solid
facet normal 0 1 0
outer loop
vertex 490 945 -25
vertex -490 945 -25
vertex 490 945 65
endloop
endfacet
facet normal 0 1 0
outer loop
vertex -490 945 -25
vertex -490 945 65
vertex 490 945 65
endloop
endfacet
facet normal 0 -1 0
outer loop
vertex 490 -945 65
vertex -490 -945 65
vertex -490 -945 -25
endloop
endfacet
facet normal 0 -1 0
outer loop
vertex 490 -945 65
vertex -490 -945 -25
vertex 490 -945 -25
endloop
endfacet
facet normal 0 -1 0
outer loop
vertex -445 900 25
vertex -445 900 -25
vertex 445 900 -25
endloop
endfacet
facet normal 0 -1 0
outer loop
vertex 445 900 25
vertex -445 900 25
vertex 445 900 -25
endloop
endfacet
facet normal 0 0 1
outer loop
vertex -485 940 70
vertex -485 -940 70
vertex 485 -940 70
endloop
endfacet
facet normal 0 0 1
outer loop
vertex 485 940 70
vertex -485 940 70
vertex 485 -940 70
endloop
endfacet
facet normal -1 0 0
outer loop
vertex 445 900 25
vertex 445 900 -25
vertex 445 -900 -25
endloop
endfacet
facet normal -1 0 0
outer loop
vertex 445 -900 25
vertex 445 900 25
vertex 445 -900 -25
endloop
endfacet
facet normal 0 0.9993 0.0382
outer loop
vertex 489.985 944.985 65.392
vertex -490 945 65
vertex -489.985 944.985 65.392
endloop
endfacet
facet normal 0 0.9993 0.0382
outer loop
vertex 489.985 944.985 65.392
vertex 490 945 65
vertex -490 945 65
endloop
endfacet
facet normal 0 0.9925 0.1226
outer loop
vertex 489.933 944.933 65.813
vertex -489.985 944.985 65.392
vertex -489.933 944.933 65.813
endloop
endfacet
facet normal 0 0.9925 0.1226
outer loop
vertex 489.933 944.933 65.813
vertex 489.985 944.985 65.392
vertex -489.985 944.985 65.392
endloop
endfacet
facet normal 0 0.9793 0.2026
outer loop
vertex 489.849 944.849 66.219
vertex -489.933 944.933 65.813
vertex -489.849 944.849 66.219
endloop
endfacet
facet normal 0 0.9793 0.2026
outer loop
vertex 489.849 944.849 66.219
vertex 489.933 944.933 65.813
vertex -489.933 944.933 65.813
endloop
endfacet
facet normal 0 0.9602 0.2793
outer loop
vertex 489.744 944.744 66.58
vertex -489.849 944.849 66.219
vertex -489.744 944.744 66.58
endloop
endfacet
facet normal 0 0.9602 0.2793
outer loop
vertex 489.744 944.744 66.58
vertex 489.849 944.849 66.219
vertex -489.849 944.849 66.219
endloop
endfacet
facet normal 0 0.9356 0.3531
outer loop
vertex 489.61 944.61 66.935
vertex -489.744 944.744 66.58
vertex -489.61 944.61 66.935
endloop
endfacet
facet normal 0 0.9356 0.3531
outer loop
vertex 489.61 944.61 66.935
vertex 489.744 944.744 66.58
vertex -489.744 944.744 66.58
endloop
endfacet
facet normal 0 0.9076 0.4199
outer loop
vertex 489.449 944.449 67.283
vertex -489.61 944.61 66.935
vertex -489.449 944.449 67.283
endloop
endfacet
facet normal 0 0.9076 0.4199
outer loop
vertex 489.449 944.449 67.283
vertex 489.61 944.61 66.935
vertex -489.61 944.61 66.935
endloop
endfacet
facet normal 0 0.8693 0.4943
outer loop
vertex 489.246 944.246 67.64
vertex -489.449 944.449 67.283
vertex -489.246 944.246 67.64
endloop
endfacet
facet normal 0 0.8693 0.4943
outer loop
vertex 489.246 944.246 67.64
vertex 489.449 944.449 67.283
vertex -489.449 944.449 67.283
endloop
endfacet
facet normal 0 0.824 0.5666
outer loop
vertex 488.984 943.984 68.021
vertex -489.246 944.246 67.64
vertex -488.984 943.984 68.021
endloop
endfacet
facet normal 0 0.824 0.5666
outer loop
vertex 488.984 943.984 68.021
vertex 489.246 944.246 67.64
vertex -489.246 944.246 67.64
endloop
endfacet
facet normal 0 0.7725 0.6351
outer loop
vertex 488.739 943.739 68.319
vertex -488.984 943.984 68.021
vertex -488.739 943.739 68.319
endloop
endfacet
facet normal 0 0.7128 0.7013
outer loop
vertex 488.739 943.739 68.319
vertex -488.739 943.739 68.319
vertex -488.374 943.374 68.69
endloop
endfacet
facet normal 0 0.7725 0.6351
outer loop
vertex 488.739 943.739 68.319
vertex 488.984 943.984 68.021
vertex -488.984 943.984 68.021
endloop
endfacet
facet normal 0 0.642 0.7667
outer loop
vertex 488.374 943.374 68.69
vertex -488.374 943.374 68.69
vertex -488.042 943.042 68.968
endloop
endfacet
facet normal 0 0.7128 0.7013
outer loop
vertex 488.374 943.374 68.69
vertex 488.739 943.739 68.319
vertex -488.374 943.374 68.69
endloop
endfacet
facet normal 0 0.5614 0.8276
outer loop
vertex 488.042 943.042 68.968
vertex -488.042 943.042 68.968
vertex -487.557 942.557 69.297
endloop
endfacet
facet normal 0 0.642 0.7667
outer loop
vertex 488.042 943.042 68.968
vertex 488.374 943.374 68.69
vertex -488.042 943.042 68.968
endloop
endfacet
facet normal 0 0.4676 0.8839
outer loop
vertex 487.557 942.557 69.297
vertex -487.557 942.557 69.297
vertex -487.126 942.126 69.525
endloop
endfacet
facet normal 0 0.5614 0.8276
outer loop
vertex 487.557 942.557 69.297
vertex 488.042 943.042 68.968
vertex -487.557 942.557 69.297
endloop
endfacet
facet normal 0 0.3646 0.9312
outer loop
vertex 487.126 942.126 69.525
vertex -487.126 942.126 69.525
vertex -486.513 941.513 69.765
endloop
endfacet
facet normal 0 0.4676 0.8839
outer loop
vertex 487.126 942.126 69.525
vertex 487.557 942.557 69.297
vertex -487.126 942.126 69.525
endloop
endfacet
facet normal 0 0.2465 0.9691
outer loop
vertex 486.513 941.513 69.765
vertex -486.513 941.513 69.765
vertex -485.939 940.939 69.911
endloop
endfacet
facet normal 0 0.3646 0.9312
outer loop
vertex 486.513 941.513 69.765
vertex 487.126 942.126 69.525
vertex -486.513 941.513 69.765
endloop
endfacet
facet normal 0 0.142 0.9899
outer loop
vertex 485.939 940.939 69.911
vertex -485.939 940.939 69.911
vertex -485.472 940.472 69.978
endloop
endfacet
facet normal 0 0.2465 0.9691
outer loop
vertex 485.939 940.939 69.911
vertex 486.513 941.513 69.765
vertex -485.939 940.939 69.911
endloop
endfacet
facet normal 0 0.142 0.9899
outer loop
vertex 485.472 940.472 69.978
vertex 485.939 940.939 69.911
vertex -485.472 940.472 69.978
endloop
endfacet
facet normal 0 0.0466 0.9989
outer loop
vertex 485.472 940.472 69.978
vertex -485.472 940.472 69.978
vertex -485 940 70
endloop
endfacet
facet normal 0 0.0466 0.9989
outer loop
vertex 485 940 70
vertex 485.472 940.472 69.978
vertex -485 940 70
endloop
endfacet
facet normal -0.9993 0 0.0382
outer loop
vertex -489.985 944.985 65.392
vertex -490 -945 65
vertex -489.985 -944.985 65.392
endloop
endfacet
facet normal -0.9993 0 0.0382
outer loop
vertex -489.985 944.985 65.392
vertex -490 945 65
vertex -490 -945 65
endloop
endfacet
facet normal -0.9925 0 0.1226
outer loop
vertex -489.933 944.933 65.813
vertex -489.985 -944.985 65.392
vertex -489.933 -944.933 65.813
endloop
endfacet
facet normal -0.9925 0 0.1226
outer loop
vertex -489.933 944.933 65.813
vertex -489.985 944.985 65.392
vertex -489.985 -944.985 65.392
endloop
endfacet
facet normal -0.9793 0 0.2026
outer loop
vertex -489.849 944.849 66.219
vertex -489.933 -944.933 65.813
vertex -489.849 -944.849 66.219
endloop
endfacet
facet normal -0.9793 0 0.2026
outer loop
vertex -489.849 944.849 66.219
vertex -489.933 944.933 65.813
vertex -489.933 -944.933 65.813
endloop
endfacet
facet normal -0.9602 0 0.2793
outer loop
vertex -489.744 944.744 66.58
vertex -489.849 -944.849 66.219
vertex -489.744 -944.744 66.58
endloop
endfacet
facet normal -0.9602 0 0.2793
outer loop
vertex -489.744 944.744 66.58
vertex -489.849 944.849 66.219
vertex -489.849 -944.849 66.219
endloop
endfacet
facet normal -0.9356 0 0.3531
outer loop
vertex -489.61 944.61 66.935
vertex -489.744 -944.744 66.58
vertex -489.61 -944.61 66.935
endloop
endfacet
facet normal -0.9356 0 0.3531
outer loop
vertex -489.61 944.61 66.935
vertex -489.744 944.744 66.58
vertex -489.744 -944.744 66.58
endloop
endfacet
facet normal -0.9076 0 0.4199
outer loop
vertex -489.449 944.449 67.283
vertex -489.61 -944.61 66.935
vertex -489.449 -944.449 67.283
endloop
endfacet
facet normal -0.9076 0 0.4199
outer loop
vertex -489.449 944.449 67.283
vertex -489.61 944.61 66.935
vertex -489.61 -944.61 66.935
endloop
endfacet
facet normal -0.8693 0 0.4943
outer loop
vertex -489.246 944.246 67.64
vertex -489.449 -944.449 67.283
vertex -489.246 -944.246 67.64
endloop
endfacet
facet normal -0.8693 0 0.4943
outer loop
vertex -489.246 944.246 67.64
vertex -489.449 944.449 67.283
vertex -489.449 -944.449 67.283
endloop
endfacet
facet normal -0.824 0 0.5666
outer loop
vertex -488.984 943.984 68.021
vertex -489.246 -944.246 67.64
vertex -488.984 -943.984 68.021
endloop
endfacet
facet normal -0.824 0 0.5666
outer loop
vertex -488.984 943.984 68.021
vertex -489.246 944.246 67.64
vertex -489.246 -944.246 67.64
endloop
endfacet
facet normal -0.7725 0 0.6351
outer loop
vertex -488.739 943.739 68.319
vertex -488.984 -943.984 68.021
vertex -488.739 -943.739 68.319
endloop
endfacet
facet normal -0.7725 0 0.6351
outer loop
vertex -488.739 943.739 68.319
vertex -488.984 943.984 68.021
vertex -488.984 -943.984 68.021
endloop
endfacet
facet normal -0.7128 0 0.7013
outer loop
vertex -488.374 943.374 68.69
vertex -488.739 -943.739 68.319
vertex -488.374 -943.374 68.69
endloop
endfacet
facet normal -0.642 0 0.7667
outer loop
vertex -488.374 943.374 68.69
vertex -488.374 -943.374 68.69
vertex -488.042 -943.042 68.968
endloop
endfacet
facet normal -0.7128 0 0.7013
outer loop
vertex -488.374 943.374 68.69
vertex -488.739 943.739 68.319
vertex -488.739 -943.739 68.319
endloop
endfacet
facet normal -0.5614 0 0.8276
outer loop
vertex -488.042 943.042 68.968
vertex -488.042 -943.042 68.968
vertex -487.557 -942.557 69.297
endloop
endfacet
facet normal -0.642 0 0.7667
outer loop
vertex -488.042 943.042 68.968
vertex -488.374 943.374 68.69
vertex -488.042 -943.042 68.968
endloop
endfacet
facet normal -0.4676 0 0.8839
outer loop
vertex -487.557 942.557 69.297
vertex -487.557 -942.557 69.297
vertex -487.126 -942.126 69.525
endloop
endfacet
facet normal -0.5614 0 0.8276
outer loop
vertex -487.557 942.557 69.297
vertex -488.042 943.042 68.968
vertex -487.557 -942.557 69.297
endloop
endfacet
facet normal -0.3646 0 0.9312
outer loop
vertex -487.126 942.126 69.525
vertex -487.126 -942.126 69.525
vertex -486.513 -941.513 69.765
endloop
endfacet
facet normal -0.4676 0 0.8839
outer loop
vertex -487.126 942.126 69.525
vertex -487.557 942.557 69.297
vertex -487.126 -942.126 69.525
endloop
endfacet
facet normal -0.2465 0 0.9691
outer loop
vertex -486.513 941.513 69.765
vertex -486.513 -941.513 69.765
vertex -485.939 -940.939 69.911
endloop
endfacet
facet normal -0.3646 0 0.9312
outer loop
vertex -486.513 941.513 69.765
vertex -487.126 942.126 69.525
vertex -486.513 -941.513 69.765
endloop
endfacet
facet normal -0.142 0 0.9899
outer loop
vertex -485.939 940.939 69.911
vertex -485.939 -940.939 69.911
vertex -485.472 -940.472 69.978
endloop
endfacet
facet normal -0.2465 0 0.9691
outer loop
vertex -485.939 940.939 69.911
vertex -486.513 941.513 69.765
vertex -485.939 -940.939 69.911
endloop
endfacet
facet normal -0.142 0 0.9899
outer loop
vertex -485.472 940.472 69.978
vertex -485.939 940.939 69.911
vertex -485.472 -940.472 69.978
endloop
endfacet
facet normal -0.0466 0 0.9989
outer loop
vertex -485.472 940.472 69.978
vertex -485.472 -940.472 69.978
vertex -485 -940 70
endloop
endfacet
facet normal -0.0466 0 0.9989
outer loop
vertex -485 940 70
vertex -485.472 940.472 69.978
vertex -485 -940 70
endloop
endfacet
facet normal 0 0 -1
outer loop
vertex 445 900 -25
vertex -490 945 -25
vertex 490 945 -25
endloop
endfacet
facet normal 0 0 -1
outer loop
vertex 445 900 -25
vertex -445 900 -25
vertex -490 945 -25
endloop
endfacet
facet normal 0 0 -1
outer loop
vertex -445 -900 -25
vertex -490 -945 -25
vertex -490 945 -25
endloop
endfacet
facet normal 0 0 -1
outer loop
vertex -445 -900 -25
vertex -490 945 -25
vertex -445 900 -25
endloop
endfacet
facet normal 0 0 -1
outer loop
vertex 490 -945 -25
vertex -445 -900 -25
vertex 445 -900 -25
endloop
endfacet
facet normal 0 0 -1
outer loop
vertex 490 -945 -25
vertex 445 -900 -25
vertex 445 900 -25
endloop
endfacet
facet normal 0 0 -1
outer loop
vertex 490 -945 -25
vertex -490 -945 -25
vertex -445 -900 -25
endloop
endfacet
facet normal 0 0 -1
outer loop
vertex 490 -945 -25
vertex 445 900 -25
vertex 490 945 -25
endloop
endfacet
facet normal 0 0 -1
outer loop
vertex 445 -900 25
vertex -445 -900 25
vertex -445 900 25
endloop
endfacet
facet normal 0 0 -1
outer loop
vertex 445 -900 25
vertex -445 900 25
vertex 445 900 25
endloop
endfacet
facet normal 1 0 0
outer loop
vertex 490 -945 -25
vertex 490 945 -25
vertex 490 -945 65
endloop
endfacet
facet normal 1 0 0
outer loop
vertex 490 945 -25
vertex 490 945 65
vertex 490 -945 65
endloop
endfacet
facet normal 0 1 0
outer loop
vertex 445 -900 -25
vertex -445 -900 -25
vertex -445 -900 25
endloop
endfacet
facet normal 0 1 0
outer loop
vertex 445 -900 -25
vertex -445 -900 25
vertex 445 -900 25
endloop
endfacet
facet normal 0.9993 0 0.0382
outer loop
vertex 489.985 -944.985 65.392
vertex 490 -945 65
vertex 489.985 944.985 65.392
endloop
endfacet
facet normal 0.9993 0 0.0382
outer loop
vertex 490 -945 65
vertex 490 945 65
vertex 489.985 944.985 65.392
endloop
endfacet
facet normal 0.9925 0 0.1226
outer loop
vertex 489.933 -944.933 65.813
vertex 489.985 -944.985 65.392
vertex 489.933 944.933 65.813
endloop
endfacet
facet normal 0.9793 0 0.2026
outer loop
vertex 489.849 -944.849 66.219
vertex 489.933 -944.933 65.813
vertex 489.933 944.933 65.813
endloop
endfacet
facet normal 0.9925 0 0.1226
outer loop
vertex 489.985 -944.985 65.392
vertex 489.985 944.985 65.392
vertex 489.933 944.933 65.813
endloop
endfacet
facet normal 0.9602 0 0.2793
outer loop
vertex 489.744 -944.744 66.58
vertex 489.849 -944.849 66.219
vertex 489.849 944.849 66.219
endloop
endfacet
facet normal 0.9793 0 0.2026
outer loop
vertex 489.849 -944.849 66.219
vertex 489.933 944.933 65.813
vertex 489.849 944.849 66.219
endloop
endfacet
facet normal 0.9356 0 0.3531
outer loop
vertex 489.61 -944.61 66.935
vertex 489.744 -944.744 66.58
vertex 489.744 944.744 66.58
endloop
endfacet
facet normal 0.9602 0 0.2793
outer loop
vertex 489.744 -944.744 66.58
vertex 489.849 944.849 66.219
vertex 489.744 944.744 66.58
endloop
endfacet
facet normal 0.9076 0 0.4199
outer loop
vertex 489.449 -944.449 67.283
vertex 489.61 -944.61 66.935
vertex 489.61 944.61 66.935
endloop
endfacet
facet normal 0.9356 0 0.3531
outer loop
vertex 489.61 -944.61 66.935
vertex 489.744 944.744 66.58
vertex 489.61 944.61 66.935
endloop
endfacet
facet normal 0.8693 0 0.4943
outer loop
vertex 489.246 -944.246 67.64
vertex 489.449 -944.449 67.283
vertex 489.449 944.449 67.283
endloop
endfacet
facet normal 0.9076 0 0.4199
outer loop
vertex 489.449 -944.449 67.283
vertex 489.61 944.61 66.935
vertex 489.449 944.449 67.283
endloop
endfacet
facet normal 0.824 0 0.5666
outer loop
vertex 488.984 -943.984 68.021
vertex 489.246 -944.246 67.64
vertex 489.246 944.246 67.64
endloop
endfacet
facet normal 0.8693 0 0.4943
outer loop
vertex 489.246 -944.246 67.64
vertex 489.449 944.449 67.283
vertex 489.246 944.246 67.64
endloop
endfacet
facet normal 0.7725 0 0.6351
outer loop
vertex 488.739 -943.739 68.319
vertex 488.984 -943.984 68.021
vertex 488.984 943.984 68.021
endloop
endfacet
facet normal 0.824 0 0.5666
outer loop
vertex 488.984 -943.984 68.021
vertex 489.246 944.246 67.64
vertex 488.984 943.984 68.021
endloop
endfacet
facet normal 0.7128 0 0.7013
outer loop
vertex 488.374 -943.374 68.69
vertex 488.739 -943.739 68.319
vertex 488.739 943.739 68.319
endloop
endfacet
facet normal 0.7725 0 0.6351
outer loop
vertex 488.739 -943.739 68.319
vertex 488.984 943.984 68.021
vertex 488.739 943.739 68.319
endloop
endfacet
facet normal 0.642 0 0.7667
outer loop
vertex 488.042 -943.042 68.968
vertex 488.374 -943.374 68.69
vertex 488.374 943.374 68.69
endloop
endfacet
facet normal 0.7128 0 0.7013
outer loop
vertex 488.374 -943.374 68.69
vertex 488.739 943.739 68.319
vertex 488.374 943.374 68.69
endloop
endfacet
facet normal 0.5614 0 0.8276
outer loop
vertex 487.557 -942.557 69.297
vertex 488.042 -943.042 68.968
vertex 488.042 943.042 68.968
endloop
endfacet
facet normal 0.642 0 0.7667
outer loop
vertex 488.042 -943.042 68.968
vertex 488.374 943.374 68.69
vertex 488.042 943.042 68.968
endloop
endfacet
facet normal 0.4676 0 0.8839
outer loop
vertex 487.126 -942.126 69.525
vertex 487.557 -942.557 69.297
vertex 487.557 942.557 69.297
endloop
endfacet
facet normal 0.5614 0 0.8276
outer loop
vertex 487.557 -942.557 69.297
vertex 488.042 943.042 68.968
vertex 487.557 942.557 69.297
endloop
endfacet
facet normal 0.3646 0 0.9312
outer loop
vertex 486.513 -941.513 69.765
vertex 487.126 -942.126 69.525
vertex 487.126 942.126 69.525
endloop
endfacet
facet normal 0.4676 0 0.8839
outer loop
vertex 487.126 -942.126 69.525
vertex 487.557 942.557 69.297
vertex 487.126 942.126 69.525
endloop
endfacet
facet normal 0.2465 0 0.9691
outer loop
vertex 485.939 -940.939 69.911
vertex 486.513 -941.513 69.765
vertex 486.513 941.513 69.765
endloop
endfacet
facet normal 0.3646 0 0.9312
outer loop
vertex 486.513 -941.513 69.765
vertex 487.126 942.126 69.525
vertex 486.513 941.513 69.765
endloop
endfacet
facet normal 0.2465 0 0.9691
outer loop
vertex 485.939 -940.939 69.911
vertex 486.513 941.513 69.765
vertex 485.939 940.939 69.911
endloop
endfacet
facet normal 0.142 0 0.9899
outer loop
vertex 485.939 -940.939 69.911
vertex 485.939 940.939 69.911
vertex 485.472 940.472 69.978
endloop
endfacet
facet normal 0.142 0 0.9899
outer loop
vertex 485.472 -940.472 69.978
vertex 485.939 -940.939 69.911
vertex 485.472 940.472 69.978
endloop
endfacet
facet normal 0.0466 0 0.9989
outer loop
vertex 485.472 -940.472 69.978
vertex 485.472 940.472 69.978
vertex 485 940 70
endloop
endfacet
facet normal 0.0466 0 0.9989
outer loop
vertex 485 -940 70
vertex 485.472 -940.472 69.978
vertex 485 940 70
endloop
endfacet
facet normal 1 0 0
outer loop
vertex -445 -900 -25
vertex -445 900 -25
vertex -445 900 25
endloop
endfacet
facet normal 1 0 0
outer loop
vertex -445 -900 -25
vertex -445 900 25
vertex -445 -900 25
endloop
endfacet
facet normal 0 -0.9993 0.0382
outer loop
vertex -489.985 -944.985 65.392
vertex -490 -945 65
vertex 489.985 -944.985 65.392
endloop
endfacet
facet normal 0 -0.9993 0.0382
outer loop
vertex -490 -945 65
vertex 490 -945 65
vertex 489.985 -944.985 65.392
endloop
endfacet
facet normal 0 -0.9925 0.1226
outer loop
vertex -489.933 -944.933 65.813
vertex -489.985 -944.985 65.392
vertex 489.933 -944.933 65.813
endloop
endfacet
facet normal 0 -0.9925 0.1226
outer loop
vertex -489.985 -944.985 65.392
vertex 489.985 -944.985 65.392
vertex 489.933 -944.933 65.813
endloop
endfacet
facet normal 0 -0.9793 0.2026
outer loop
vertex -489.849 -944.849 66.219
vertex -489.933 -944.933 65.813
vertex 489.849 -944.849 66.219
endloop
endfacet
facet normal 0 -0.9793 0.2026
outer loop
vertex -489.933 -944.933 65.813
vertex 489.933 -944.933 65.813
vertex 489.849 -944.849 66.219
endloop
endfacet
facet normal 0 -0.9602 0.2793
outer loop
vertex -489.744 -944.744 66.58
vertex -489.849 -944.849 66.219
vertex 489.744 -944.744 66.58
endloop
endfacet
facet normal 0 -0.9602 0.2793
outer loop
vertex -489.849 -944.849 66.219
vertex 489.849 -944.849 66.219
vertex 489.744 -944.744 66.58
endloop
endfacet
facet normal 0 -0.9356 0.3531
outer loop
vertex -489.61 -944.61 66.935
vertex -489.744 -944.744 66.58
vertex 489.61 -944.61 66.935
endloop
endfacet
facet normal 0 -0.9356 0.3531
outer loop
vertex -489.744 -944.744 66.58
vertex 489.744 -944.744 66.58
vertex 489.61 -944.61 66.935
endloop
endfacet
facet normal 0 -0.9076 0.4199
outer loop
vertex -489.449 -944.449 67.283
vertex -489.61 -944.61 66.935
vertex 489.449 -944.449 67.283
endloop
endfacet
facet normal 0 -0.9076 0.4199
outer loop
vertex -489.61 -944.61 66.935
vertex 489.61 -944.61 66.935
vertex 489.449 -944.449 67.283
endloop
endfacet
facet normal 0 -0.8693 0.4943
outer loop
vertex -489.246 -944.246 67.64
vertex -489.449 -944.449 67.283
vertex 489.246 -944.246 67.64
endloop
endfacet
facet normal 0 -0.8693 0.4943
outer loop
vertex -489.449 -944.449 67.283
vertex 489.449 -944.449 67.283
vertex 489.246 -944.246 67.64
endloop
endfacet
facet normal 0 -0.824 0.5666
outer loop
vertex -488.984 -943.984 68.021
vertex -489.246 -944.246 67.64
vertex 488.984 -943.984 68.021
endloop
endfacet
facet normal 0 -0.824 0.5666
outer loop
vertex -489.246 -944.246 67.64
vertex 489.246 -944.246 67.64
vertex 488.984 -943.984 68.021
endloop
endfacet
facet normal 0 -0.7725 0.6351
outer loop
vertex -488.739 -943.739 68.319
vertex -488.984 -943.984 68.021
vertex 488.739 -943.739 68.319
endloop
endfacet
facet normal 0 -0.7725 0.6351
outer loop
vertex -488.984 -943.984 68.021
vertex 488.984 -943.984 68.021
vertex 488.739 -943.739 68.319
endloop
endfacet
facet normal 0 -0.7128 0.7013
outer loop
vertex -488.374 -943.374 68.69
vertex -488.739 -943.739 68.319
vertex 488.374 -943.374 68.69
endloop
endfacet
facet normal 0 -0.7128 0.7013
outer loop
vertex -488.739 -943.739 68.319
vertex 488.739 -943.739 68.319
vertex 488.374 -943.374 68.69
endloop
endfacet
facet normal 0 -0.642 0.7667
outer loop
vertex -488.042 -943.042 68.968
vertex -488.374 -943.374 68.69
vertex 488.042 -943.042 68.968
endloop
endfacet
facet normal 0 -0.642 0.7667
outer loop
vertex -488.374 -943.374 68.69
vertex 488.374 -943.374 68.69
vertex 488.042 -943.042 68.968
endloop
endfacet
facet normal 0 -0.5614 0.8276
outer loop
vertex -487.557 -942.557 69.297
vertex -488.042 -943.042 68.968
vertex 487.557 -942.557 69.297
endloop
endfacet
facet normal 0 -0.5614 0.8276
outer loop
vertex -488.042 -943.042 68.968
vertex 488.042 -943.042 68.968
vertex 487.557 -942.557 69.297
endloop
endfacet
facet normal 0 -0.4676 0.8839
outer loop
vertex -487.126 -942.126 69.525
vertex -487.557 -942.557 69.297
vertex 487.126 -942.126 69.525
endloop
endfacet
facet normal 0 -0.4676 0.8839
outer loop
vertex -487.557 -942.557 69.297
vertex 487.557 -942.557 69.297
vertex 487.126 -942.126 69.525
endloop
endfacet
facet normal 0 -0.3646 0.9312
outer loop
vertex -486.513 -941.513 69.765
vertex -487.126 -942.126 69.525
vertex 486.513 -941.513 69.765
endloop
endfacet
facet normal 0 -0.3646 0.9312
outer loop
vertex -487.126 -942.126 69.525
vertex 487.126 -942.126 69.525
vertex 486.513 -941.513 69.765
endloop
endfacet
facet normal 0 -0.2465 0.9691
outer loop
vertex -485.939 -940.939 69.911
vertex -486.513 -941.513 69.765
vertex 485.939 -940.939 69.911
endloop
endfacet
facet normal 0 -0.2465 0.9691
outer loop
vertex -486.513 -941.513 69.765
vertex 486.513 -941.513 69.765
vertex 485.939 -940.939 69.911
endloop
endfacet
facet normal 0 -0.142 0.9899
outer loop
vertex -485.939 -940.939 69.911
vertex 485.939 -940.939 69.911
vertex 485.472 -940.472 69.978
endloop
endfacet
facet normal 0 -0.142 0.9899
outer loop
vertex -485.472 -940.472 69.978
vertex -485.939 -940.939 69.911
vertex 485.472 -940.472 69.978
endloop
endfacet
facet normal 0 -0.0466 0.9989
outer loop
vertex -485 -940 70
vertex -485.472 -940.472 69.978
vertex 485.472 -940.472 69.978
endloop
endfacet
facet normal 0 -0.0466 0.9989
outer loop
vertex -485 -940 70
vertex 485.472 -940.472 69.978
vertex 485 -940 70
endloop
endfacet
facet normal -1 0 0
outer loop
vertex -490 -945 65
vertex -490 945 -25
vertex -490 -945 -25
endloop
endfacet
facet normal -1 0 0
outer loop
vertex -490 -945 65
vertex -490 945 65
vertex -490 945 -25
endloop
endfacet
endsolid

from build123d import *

# Parameters (mm, degrees)
F0_W        = 980
F0_H        = 1890
F1_DEPTH    = 70
F2_R        = 5
F3_W        = 980
F3_H        = 1890
F1_FACE_W   = 980
F1_FACE_H   = 1890
F1_FACE_W_2 = 970
F1_FACE_H_2 = 1880
F4_DEPTH    = 25
F5_W        = 890
F5_H        = 1800
F6_DEPTH    = 50


with BuildPart() as f1:
    # F0 (on Top) → F1 (new body)
    with BuildSketch(Plane.XY):
        Rectangle(F0_W, F0_H)
    extrude(amount=F1_DEPTH)

    # F2
    f2_edges = [f1.edges().sort_by_distance(p)[0] for p in [
        (0, 945, 70),
        (-490, 0, 70),
        (0, -945, 70),
        (490, 0, 70),
    ]]
    fillet(f2_edges, radius=F2_R)

    # F3 (on face) + F1_face (on face) → F4 (join)
    with BuildSketch(Plane(origin=(0, 0, 0), x_dir=(1, 0, 0), z_dir=(0, 0, -1))):
        Rectangle(F3_W, F3_H)
    with BuildSketch(Plane(origin=(0, 0, 0), x_dir=(1, 0, 0), z_dir=(0, 0, -1))):
        Rectangle(F1_FACE_W, F1_FACE_H)
        Rectangle(F1_FACE_W_2, F1_FACE_H_2)
    extrude(amount=F4_DEPTH)

    # F5 (on face) → F6 (cut)
    with BuildSketch(Plane(origin=(0, 0, -25), x_dir=(1, 0, 0), z_dir=(0, 0, -1))):
        Rectangle(F5_W, F5_H)
    extrude(amount=-F6_DEPTH, mode=Mode.SUBTRACT)


solid = f1.part
